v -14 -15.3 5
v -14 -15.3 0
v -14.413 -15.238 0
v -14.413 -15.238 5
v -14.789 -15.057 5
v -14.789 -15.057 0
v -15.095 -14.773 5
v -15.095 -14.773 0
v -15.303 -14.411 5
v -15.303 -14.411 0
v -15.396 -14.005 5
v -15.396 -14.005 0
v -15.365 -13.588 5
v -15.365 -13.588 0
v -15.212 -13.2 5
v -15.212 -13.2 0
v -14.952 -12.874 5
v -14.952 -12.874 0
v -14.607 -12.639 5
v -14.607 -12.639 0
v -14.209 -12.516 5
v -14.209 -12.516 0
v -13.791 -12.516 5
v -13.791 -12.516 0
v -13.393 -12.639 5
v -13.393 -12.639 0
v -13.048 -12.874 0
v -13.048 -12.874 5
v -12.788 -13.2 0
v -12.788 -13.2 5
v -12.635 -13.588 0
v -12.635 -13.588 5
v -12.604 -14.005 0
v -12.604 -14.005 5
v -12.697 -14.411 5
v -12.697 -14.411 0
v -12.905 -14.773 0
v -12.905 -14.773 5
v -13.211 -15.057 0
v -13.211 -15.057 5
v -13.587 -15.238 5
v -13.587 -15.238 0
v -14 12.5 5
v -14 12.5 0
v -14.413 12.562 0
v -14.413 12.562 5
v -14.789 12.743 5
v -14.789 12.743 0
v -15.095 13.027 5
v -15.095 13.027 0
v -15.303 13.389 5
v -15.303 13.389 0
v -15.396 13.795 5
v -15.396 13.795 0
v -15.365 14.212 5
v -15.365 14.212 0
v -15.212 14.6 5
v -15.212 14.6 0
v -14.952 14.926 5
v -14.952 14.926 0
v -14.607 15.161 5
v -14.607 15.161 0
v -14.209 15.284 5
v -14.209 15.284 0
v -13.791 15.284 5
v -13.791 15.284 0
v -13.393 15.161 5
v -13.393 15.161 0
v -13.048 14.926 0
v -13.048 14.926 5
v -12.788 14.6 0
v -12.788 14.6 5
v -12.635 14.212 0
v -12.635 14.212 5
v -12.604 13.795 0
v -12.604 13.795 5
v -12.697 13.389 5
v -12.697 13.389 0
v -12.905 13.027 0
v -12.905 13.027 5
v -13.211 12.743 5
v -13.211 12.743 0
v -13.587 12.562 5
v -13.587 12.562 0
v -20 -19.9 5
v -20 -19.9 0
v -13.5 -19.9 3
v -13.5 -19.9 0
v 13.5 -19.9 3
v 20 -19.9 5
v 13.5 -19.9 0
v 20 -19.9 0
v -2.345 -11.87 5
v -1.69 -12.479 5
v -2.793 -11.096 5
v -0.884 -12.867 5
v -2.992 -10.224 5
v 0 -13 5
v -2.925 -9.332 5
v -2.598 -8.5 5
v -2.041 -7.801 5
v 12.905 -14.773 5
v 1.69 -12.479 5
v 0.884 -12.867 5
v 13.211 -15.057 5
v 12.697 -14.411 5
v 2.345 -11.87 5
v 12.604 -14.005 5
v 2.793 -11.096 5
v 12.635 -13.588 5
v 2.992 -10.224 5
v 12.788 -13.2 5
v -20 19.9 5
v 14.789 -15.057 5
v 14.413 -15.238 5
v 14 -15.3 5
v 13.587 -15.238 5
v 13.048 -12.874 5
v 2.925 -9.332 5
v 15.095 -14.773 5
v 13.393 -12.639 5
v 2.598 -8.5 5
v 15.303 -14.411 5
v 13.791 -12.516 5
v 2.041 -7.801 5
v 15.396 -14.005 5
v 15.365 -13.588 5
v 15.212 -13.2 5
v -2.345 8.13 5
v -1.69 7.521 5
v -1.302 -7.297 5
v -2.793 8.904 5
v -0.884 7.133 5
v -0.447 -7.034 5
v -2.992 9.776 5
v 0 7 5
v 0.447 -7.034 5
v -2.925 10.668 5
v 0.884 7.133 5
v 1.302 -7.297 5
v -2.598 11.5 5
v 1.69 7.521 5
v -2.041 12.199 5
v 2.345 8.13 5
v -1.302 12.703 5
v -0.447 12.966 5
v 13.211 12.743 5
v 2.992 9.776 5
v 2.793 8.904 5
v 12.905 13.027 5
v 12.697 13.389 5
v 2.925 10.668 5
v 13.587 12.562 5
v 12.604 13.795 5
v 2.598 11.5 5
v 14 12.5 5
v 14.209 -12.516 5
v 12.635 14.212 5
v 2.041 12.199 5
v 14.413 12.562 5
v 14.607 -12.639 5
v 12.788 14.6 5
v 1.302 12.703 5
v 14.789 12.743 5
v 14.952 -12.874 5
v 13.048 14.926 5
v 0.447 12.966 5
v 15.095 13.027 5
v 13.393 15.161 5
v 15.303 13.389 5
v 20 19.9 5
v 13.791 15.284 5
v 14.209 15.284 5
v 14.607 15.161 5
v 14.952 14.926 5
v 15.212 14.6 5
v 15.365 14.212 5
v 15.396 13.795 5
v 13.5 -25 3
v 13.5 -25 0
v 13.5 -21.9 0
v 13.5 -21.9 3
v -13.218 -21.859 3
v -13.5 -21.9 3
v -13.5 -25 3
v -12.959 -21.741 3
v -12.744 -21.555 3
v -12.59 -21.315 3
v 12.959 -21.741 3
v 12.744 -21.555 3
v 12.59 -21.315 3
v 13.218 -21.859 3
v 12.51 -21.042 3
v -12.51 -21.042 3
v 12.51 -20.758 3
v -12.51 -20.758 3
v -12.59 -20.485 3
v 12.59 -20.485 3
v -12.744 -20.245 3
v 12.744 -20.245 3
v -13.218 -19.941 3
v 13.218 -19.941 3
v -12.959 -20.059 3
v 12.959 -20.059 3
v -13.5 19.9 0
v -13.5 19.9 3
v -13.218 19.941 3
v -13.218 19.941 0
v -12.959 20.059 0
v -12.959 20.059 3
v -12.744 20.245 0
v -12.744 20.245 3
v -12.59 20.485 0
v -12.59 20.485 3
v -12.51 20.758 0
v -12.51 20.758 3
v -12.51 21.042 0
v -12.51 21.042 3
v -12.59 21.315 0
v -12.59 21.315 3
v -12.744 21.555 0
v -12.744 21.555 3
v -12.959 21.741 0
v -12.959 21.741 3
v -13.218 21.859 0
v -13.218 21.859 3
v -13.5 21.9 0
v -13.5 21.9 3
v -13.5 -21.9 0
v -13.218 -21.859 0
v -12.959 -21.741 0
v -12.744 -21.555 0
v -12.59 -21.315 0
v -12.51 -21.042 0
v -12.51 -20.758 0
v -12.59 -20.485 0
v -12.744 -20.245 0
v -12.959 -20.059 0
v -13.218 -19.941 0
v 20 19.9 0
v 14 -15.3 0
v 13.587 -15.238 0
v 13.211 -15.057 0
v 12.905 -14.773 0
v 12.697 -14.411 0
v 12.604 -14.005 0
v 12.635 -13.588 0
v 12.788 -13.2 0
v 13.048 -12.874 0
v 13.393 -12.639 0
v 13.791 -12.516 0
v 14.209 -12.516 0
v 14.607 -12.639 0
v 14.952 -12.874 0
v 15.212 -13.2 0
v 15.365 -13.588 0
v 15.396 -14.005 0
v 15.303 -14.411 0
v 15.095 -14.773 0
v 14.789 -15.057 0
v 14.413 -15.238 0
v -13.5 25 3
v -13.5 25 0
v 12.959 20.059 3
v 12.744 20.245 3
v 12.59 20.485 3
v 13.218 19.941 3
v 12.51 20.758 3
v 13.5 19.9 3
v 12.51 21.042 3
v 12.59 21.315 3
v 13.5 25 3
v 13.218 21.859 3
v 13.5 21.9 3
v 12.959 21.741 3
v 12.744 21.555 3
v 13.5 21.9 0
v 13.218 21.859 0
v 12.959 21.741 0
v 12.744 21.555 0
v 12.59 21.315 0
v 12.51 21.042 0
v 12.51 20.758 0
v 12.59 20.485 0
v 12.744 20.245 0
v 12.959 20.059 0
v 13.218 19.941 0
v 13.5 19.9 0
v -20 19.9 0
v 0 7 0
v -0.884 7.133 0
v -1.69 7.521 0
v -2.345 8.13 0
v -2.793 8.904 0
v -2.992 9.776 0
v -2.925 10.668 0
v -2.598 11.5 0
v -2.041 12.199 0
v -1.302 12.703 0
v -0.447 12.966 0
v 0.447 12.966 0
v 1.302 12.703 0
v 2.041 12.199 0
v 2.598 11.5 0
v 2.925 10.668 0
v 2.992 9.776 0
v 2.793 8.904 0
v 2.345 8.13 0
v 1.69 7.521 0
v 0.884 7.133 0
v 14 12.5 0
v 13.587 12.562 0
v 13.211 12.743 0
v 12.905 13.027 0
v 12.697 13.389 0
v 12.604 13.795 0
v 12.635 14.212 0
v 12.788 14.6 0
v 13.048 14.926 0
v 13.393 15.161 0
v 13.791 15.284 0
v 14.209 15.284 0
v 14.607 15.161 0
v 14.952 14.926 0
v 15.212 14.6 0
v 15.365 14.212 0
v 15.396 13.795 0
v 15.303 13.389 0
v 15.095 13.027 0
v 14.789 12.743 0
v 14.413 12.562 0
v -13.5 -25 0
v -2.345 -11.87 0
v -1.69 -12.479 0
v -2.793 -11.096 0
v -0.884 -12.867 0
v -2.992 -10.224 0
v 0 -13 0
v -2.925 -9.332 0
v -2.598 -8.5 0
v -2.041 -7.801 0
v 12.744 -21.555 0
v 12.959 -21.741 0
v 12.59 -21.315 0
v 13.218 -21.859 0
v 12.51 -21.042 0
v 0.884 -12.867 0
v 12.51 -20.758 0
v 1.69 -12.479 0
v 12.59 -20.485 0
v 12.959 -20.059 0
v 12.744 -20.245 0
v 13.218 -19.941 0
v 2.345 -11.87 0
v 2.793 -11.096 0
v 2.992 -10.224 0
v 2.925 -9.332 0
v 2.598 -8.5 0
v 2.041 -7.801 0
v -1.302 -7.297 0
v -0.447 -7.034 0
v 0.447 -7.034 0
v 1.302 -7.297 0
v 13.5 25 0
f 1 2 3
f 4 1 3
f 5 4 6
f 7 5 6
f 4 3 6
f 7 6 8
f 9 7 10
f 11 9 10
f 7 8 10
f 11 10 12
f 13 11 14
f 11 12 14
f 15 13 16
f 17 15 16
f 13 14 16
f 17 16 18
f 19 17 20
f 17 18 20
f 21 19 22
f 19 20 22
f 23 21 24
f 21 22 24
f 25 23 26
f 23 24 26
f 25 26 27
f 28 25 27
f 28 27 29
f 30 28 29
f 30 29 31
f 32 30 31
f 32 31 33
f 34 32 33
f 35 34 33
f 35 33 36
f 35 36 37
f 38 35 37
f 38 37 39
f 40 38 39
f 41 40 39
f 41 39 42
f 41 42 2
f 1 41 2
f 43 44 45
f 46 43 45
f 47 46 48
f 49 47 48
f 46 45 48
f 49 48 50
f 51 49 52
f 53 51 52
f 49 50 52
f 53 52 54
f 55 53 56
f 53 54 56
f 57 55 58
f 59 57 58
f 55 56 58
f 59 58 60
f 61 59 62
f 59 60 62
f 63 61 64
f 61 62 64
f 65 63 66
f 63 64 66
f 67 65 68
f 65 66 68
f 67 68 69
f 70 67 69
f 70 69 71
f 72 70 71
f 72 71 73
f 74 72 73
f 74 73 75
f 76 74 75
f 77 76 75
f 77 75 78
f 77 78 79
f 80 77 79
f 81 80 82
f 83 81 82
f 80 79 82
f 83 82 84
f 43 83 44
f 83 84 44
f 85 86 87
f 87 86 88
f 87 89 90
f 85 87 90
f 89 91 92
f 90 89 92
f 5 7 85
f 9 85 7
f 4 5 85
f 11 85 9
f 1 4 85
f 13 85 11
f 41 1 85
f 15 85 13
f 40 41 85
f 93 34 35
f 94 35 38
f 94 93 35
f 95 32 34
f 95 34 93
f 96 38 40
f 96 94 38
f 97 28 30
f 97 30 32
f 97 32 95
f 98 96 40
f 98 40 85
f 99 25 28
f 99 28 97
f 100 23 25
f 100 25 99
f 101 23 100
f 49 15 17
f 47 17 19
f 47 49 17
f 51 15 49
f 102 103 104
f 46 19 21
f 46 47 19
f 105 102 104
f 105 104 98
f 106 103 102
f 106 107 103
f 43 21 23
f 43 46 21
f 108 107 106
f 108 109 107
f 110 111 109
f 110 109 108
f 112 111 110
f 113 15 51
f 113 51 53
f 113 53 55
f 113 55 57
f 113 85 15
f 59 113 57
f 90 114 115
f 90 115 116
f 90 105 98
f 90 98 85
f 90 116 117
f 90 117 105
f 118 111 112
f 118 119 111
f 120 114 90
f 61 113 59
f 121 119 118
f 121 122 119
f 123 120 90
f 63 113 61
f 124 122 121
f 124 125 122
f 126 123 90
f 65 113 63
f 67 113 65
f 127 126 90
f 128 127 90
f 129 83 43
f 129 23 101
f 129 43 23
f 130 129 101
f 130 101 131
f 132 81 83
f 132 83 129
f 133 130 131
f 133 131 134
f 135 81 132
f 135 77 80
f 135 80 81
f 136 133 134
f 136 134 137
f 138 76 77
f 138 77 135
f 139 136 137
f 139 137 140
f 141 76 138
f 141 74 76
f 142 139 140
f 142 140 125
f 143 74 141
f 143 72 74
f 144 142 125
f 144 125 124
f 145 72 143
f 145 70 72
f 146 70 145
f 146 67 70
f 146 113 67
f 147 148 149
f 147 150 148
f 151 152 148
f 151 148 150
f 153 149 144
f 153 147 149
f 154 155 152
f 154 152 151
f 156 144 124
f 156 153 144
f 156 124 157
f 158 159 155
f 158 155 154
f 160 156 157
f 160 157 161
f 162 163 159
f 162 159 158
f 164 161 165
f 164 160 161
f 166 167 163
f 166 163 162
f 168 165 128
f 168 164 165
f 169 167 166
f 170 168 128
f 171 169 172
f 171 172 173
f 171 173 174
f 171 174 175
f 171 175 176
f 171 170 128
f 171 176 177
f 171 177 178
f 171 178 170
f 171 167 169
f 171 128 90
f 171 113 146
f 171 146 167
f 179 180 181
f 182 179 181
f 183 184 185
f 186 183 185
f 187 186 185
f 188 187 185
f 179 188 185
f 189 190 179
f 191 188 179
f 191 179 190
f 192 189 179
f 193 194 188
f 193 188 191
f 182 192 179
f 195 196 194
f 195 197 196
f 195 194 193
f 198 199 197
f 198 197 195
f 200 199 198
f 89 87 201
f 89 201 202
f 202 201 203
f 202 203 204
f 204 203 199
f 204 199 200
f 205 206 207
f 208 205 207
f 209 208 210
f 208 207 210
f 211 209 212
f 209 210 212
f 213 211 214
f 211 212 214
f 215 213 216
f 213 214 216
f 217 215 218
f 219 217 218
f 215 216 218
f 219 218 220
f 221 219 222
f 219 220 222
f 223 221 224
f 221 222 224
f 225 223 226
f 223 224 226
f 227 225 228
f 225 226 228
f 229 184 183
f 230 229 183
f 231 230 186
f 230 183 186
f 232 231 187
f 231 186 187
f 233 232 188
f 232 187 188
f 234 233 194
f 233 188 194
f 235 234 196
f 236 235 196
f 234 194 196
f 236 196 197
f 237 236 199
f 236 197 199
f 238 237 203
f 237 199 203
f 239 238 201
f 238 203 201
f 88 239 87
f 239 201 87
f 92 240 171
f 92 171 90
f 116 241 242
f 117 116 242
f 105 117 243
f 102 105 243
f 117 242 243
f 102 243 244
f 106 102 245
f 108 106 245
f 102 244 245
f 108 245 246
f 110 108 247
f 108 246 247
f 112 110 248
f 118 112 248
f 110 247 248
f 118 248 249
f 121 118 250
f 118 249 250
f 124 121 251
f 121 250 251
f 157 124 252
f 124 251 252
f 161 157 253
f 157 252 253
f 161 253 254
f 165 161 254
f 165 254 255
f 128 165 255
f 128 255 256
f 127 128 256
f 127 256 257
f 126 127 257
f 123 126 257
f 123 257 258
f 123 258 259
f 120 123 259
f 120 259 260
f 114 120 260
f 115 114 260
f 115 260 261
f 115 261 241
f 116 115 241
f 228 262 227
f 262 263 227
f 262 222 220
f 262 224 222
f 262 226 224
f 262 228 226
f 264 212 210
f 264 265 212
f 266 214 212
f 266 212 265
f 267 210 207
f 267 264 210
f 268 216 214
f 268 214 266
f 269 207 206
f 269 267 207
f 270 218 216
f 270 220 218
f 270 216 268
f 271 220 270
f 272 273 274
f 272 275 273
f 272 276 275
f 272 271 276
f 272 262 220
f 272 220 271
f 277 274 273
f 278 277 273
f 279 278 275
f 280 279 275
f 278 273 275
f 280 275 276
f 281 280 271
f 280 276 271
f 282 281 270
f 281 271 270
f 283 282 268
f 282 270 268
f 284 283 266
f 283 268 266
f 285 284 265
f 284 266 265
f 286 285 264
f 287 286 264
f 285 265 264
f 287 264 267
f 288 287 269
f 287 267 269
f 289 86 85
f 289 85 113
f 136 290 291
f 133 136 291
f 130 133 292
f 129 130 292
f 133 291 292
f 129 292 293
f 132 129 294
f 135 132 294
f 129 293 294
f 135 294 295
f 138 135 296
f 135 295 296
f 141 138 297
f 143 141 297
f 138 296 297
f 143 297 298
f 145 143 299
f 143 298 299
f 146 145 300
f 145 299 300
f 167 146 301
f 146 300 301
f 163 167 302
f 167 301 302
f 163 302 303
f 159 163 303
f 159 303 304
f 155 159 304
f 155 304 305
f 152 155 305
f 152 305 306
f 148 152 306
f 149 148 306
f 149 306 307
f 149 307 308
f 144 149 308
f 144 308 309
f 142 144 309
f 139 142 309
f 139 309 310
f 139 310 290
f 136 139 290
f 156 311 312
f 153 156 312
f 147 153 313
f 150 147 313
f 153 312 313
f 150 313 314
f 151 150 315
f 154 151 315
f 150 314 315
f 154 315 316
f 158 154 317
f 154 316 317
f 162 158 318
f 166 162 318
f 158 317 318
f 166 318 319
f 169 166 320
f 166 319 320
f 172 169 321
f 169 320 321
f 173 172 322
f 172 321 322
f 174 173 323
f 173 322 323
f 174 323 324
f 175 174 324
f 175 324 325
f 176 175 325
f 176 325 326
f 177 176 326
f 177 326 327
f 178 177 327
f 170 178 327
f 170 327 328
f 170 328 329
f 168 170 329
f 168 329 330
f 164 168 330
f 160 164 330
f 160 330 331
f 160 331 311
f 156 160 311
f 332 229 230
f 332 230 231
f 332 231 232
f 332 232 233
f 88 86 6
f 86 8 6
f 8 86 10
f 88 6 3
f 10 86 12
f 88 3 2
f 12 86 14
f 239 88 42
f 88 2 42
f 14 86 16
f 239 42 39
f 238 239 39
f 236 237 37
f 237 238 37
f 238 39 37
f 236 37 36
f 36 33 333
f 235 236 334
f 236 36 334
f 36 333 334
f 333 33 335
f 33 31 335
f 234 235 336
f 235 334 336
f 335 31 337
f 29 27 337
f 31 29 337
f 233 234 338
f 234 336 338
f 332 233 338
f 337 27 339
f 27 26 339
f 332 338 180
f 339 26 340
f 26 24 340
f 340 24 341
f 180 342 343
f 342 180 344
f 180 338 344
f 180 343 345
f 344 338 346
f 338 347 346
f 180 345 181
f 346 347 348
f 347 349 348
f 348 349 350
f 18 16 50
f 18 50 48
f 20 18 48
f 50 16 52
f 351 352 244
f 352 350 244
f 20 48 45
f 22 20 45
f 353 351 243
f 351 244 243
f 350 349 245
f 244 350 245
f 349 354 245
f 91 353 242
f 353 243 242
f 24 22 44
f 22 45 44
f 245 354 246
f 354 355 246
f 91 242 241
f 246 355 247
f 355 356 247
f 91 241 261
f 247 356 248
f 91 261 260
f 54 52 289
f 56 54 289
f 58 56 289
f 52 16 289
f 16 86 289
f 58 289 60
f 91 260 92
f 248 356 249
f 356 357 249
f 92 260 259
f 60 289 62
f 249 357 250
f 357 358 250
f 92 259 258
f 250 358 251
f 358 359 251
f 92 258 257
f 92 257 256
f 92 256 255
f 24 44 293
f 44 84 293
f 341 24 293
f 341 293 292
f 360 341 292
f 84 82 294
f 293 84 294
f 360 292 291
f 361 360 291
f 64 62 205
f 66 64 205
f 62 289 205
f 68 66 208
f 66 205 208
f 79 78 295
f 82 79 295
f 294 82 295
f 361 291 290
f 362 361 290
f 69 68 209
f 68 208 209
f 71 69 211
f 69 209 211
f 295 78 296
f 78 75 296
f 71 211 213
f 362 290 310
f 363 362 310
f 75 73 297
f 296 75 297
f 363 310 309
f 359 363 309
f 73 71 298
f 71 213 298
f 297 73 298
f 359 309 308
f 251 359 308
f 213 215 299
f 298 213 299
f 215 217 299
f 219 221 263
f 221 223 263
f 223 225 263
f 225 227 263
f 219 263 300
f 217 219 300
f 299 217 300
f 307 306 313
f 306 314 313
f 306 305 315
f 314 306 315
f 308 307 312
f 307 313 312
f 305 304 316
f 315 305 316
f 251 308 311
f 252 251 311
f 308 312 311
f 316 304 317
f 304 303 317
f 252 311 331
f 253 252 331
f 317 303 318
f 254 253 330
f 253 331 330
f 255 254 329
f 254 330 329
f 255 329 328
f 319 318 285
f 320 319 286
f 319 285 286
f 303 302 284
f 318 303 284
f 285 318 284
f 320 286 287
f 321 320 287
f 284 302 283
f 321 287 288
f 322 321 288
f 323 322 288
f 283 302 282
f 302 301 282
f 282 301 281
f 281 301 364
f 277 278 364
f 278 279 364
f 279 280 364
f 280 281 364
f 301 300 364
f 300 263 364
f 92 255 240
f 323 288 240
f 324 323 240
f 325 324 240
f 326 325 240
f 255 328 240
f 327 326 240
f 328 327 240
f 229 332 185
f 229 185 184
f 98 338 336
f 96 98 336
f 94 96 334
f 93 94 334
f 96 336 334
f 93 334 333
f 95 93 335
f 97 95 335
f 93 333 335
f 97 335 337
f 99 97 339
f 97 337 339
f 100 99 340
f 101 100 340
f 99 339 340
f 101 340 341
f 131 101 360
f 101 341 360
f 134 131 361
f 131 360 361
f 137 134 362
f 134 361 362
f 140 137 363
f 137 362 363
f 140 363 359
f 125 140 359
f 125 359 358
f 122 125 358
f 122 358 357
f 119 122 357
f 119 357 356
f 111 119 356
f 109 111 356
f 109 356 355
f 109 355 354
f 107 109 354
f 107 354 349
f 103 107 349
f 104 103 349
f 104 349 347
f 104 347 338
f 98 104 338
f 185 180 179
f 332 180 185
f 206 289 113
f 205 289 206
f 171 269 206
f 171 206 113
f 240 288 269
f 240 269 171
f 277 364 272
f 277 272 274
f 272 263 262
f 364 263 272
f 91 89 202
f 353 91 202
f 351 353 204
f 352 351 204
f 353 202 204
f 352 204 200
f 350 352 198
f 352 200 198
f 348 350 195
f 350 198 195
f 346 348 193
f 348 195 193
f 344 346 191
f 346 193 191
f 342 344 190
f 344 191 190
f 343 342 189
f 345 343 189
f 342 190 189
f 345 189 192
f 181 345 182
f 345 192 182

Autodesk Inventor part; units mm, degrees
ref_plane "YZ Plane" through (0, 0, 0) normal (1, 0, 0) x (0, 1, 0)
ref_plane "XZ Plane" through (0, 0, 0) normal (0, 1, 0) x (-1, 0, 0)
ref_plane "XY Plane" through (0, 0, 0) normal (0, 0, 1) x (1, 0, 0)
sketch "スケッチ1" plane through (0, 0, 0) normal (0, 0, 1) x (1, 0, 0)
  line L0 (-20, 25) -> (20, 25)
  line L1 (20, 25) -> (20, -25)
  line L2 (20, -25) -> (-20, -25)
  line L3 (-20, -25) -> (-20, 25)
  point P0 (0, 0)
  dimension "d0" = 50
  dimension "d1" = 40
  dimension "d2" = 20
  dimension "d3" = 25
extrude "押し出し1" add sketch "スケッチ1" along normal blind 5
sketch "スケッチ2" plane through (0, 0, 5) normal (0, 0, 1) x (1, 0, 0)
  line L0 (20, 25) -> (20, -25) projected
  line L1 (-20, -25) -> (-20, 25) projected
  line L2 (20, -25) -> (-20, -25) projected
  line L3 (-20, 25) -> (20, 25)
  line L4 (20, 25) -> (20, 19.9)
  line L5 (20, 19.9) -> (-20, 19.9)
  line L6 (-20, 19.9) -> (-20, 25)
  line L7 (20, -25) -> (-20, -25)
  line L8 (-20, -25) -> (-20, -19.9)
  line L9 (-20, -19.9) -> (20, -19.9)
  line L10 (20, -19.9) -> (20, -25)
  point P0 (0, 0)
  dimension "d6" = 5.1
  dimension "d7" = 5.1
  dimension "d12" = 0
extrude "押し出し3" cut sketch "スケッチ2" against normal blind 2 contours L0 L5 L1 L3 | L0 L2 L1 L9
sketch "スケッチ3" plane through (0, 0, 5) normal (0, 0, 1) x (1, 0, 0)
  point P0 (0, 0)
  point P1 (0, 10)
  point P2 (0, -10)
  dimension "d13" = 20
  dimension "d14" = 10
hole "Hole1" at (0, 10, 5) at (0, -10, 5) direction (0, 0, -1) diameter 6 end through all
sketch "スケッチ4" plane through (0, 0, 0) normal (0, 0, -1) x (-1, 0, 0)
  circle A0 centre (0, -10) radius 3 projected
  circle A1 centre (0, 10) radius 3 projected
  line L0 (20, 25) -> (-20, 25) projected
  line L1 (-20, 25) -> (-13.5, 25)
  line L2 (-13.5, 25) -> (-13.5, 19.9)
  line L3 (-13.5, 19.9) -> (-20, 19.9)
  line L4 (-20, 19.9) -> (-20, 25)
  line L5 (20, 25) -> (13.5, 25)
  line L6 (13.5, 25) -> (13.5, 19.9)
  line L7 (13.5, 19.9) -> (20, 19.9)
  line L8 (20, 19.9) -> (20, 25)
  line L9 (20, -25) -> (13.5, -25)
  line L10 (13.5, -25) -> (13.5, -19.9)
  line L11 (13.5, -19.9) -> (20, -19.9)
  line L12 (20, -19.9) -> (20, -25)
  line L13 (-20, -25) -> (-13.5, -25)
  line L14 (-13.5, -25) -> (-13.5, -19.9)
  line L15 (-13.5, -19.9) -> (-20, -19.9)
  line L16 (-20, -19.9) -> (-20, -25)
  point P0 (0, 0)
  dimension "d22" = 5.1
  dimension "d23" = 5.1
  dimension "d24" = 5.1
  dimension "d25" = 5.1
  dimension "d26" = 27
  dimension "d27" = 13.5
  dimension "d28" = 13.5
  dimension "d29" = 27
extrude "押し出し4" cut sketch "スケッチ4" against normal through all contours L8 L7 L6 L0 | L2 L3 L4 L0 | L9 L10 L11 L12 | L16 L15 L14 L13
sketch "スケッチ5" plane through (0, 0, 5) normal (0, 0, 1) x (1, 0, 0)
  line L0 (20, 19.9) -> (-20, 19.9) projected
  line L1 (-20, -19.9) -> (-20, 19.9) projected
  line L2 (-20, -19.9) -> (20, -19.9) projected
  line L3 (20, 19.9) -> (20, -19.9) projected
  point P0 (0, 0)
  point P1 (-14, 13.9)
  point P2 (-14, -13.9)
  point P3 (14, -13.9)
  point P4 (14, 13.9)
  dimension "d32" = 6
  dimension "d33" = 6
  dimension "d34" = 6
  dimension "d35" = 6
  dimension "d36" = 6
  dimension "d37" = 6
  dimension "d38" = 6
  dimension "d39" = 6
hole "Hole2" at (-14, 13.9, 5) at (-14, -13.9, 5) at (14, -13.9, 5) at (14, 13.9, 5) direction (0, 0, -1) diameter 2.8 depth 8 tip angle 118
sketch "スケッチ6" plane through (0, 0, 0) normal (0, 0, -1) x (-1, 0, 0)
  line L0 (-20, -19.9) -> (-13.5, -19.9) projected
  line L1 (-13.5, -19.9) -> (-13.5, -25) projected
  line L2 (13.5, -25) -> (13.5, -19.9) projected
  line L3 (13.5, -19.9) -> (20, -19.9) projected
  line L4 (20, 19.9) -> (13.5, 19.9) projected
  line L5 (13.5, 19.9) -> (13.5, 25) projected
  line L6 (-13.5, 19.9) -> (-20, 19.9) projected
  line L7 (-13.5, 19.9) -> (-13.5, 25) projected
  point P0 (0, 0)
  point P1 (-13.5, 20.9)
  point P2 (13.5, 20.9)
  point P3 (13.5, -20.9)
  point P4 (-13.5, -20.9)
  dimension "d47" = 1
  dimension "d48" = 1
  dimension "d49" = 1
  dimension "d50" = 1
hole "Hole3" at (13.5, 20.9, 0) at (-13.5, 20.9, 0) at (-13.5, -20.9, 0) at (13.5, -20.9, 0) direction (0, 0, 1) diameter 2 depth 8 tip angle 118
equation "\"d2\" = 0.5 * d1"
equation "\"d3\" = 0.5 * d0"
equation "\"d14\" = 0.5 * d13"
equation "\"d23\" = d22"
equation "\"d24\" = d22"
equation "\"d25\" = d22"
equation "\"d27\" = 0.5 * d26"
equation "\"d28\" = d27"
equation "\"d29\" = d26"
equation "\"d33\" = d32"
equation "\"d34\" = d32"
equation "\"d35\" = d32"
equation "\"d36\" = d32"
equation "\"d37\" = d32"
equation "\"d38\" = d32"
equation "\"d39\" = d32"
equation "\"d48\" = d47"
equation "\"d49\" = d47"
equation "\"d50\" = d47"
properties part number "JointC0_"
